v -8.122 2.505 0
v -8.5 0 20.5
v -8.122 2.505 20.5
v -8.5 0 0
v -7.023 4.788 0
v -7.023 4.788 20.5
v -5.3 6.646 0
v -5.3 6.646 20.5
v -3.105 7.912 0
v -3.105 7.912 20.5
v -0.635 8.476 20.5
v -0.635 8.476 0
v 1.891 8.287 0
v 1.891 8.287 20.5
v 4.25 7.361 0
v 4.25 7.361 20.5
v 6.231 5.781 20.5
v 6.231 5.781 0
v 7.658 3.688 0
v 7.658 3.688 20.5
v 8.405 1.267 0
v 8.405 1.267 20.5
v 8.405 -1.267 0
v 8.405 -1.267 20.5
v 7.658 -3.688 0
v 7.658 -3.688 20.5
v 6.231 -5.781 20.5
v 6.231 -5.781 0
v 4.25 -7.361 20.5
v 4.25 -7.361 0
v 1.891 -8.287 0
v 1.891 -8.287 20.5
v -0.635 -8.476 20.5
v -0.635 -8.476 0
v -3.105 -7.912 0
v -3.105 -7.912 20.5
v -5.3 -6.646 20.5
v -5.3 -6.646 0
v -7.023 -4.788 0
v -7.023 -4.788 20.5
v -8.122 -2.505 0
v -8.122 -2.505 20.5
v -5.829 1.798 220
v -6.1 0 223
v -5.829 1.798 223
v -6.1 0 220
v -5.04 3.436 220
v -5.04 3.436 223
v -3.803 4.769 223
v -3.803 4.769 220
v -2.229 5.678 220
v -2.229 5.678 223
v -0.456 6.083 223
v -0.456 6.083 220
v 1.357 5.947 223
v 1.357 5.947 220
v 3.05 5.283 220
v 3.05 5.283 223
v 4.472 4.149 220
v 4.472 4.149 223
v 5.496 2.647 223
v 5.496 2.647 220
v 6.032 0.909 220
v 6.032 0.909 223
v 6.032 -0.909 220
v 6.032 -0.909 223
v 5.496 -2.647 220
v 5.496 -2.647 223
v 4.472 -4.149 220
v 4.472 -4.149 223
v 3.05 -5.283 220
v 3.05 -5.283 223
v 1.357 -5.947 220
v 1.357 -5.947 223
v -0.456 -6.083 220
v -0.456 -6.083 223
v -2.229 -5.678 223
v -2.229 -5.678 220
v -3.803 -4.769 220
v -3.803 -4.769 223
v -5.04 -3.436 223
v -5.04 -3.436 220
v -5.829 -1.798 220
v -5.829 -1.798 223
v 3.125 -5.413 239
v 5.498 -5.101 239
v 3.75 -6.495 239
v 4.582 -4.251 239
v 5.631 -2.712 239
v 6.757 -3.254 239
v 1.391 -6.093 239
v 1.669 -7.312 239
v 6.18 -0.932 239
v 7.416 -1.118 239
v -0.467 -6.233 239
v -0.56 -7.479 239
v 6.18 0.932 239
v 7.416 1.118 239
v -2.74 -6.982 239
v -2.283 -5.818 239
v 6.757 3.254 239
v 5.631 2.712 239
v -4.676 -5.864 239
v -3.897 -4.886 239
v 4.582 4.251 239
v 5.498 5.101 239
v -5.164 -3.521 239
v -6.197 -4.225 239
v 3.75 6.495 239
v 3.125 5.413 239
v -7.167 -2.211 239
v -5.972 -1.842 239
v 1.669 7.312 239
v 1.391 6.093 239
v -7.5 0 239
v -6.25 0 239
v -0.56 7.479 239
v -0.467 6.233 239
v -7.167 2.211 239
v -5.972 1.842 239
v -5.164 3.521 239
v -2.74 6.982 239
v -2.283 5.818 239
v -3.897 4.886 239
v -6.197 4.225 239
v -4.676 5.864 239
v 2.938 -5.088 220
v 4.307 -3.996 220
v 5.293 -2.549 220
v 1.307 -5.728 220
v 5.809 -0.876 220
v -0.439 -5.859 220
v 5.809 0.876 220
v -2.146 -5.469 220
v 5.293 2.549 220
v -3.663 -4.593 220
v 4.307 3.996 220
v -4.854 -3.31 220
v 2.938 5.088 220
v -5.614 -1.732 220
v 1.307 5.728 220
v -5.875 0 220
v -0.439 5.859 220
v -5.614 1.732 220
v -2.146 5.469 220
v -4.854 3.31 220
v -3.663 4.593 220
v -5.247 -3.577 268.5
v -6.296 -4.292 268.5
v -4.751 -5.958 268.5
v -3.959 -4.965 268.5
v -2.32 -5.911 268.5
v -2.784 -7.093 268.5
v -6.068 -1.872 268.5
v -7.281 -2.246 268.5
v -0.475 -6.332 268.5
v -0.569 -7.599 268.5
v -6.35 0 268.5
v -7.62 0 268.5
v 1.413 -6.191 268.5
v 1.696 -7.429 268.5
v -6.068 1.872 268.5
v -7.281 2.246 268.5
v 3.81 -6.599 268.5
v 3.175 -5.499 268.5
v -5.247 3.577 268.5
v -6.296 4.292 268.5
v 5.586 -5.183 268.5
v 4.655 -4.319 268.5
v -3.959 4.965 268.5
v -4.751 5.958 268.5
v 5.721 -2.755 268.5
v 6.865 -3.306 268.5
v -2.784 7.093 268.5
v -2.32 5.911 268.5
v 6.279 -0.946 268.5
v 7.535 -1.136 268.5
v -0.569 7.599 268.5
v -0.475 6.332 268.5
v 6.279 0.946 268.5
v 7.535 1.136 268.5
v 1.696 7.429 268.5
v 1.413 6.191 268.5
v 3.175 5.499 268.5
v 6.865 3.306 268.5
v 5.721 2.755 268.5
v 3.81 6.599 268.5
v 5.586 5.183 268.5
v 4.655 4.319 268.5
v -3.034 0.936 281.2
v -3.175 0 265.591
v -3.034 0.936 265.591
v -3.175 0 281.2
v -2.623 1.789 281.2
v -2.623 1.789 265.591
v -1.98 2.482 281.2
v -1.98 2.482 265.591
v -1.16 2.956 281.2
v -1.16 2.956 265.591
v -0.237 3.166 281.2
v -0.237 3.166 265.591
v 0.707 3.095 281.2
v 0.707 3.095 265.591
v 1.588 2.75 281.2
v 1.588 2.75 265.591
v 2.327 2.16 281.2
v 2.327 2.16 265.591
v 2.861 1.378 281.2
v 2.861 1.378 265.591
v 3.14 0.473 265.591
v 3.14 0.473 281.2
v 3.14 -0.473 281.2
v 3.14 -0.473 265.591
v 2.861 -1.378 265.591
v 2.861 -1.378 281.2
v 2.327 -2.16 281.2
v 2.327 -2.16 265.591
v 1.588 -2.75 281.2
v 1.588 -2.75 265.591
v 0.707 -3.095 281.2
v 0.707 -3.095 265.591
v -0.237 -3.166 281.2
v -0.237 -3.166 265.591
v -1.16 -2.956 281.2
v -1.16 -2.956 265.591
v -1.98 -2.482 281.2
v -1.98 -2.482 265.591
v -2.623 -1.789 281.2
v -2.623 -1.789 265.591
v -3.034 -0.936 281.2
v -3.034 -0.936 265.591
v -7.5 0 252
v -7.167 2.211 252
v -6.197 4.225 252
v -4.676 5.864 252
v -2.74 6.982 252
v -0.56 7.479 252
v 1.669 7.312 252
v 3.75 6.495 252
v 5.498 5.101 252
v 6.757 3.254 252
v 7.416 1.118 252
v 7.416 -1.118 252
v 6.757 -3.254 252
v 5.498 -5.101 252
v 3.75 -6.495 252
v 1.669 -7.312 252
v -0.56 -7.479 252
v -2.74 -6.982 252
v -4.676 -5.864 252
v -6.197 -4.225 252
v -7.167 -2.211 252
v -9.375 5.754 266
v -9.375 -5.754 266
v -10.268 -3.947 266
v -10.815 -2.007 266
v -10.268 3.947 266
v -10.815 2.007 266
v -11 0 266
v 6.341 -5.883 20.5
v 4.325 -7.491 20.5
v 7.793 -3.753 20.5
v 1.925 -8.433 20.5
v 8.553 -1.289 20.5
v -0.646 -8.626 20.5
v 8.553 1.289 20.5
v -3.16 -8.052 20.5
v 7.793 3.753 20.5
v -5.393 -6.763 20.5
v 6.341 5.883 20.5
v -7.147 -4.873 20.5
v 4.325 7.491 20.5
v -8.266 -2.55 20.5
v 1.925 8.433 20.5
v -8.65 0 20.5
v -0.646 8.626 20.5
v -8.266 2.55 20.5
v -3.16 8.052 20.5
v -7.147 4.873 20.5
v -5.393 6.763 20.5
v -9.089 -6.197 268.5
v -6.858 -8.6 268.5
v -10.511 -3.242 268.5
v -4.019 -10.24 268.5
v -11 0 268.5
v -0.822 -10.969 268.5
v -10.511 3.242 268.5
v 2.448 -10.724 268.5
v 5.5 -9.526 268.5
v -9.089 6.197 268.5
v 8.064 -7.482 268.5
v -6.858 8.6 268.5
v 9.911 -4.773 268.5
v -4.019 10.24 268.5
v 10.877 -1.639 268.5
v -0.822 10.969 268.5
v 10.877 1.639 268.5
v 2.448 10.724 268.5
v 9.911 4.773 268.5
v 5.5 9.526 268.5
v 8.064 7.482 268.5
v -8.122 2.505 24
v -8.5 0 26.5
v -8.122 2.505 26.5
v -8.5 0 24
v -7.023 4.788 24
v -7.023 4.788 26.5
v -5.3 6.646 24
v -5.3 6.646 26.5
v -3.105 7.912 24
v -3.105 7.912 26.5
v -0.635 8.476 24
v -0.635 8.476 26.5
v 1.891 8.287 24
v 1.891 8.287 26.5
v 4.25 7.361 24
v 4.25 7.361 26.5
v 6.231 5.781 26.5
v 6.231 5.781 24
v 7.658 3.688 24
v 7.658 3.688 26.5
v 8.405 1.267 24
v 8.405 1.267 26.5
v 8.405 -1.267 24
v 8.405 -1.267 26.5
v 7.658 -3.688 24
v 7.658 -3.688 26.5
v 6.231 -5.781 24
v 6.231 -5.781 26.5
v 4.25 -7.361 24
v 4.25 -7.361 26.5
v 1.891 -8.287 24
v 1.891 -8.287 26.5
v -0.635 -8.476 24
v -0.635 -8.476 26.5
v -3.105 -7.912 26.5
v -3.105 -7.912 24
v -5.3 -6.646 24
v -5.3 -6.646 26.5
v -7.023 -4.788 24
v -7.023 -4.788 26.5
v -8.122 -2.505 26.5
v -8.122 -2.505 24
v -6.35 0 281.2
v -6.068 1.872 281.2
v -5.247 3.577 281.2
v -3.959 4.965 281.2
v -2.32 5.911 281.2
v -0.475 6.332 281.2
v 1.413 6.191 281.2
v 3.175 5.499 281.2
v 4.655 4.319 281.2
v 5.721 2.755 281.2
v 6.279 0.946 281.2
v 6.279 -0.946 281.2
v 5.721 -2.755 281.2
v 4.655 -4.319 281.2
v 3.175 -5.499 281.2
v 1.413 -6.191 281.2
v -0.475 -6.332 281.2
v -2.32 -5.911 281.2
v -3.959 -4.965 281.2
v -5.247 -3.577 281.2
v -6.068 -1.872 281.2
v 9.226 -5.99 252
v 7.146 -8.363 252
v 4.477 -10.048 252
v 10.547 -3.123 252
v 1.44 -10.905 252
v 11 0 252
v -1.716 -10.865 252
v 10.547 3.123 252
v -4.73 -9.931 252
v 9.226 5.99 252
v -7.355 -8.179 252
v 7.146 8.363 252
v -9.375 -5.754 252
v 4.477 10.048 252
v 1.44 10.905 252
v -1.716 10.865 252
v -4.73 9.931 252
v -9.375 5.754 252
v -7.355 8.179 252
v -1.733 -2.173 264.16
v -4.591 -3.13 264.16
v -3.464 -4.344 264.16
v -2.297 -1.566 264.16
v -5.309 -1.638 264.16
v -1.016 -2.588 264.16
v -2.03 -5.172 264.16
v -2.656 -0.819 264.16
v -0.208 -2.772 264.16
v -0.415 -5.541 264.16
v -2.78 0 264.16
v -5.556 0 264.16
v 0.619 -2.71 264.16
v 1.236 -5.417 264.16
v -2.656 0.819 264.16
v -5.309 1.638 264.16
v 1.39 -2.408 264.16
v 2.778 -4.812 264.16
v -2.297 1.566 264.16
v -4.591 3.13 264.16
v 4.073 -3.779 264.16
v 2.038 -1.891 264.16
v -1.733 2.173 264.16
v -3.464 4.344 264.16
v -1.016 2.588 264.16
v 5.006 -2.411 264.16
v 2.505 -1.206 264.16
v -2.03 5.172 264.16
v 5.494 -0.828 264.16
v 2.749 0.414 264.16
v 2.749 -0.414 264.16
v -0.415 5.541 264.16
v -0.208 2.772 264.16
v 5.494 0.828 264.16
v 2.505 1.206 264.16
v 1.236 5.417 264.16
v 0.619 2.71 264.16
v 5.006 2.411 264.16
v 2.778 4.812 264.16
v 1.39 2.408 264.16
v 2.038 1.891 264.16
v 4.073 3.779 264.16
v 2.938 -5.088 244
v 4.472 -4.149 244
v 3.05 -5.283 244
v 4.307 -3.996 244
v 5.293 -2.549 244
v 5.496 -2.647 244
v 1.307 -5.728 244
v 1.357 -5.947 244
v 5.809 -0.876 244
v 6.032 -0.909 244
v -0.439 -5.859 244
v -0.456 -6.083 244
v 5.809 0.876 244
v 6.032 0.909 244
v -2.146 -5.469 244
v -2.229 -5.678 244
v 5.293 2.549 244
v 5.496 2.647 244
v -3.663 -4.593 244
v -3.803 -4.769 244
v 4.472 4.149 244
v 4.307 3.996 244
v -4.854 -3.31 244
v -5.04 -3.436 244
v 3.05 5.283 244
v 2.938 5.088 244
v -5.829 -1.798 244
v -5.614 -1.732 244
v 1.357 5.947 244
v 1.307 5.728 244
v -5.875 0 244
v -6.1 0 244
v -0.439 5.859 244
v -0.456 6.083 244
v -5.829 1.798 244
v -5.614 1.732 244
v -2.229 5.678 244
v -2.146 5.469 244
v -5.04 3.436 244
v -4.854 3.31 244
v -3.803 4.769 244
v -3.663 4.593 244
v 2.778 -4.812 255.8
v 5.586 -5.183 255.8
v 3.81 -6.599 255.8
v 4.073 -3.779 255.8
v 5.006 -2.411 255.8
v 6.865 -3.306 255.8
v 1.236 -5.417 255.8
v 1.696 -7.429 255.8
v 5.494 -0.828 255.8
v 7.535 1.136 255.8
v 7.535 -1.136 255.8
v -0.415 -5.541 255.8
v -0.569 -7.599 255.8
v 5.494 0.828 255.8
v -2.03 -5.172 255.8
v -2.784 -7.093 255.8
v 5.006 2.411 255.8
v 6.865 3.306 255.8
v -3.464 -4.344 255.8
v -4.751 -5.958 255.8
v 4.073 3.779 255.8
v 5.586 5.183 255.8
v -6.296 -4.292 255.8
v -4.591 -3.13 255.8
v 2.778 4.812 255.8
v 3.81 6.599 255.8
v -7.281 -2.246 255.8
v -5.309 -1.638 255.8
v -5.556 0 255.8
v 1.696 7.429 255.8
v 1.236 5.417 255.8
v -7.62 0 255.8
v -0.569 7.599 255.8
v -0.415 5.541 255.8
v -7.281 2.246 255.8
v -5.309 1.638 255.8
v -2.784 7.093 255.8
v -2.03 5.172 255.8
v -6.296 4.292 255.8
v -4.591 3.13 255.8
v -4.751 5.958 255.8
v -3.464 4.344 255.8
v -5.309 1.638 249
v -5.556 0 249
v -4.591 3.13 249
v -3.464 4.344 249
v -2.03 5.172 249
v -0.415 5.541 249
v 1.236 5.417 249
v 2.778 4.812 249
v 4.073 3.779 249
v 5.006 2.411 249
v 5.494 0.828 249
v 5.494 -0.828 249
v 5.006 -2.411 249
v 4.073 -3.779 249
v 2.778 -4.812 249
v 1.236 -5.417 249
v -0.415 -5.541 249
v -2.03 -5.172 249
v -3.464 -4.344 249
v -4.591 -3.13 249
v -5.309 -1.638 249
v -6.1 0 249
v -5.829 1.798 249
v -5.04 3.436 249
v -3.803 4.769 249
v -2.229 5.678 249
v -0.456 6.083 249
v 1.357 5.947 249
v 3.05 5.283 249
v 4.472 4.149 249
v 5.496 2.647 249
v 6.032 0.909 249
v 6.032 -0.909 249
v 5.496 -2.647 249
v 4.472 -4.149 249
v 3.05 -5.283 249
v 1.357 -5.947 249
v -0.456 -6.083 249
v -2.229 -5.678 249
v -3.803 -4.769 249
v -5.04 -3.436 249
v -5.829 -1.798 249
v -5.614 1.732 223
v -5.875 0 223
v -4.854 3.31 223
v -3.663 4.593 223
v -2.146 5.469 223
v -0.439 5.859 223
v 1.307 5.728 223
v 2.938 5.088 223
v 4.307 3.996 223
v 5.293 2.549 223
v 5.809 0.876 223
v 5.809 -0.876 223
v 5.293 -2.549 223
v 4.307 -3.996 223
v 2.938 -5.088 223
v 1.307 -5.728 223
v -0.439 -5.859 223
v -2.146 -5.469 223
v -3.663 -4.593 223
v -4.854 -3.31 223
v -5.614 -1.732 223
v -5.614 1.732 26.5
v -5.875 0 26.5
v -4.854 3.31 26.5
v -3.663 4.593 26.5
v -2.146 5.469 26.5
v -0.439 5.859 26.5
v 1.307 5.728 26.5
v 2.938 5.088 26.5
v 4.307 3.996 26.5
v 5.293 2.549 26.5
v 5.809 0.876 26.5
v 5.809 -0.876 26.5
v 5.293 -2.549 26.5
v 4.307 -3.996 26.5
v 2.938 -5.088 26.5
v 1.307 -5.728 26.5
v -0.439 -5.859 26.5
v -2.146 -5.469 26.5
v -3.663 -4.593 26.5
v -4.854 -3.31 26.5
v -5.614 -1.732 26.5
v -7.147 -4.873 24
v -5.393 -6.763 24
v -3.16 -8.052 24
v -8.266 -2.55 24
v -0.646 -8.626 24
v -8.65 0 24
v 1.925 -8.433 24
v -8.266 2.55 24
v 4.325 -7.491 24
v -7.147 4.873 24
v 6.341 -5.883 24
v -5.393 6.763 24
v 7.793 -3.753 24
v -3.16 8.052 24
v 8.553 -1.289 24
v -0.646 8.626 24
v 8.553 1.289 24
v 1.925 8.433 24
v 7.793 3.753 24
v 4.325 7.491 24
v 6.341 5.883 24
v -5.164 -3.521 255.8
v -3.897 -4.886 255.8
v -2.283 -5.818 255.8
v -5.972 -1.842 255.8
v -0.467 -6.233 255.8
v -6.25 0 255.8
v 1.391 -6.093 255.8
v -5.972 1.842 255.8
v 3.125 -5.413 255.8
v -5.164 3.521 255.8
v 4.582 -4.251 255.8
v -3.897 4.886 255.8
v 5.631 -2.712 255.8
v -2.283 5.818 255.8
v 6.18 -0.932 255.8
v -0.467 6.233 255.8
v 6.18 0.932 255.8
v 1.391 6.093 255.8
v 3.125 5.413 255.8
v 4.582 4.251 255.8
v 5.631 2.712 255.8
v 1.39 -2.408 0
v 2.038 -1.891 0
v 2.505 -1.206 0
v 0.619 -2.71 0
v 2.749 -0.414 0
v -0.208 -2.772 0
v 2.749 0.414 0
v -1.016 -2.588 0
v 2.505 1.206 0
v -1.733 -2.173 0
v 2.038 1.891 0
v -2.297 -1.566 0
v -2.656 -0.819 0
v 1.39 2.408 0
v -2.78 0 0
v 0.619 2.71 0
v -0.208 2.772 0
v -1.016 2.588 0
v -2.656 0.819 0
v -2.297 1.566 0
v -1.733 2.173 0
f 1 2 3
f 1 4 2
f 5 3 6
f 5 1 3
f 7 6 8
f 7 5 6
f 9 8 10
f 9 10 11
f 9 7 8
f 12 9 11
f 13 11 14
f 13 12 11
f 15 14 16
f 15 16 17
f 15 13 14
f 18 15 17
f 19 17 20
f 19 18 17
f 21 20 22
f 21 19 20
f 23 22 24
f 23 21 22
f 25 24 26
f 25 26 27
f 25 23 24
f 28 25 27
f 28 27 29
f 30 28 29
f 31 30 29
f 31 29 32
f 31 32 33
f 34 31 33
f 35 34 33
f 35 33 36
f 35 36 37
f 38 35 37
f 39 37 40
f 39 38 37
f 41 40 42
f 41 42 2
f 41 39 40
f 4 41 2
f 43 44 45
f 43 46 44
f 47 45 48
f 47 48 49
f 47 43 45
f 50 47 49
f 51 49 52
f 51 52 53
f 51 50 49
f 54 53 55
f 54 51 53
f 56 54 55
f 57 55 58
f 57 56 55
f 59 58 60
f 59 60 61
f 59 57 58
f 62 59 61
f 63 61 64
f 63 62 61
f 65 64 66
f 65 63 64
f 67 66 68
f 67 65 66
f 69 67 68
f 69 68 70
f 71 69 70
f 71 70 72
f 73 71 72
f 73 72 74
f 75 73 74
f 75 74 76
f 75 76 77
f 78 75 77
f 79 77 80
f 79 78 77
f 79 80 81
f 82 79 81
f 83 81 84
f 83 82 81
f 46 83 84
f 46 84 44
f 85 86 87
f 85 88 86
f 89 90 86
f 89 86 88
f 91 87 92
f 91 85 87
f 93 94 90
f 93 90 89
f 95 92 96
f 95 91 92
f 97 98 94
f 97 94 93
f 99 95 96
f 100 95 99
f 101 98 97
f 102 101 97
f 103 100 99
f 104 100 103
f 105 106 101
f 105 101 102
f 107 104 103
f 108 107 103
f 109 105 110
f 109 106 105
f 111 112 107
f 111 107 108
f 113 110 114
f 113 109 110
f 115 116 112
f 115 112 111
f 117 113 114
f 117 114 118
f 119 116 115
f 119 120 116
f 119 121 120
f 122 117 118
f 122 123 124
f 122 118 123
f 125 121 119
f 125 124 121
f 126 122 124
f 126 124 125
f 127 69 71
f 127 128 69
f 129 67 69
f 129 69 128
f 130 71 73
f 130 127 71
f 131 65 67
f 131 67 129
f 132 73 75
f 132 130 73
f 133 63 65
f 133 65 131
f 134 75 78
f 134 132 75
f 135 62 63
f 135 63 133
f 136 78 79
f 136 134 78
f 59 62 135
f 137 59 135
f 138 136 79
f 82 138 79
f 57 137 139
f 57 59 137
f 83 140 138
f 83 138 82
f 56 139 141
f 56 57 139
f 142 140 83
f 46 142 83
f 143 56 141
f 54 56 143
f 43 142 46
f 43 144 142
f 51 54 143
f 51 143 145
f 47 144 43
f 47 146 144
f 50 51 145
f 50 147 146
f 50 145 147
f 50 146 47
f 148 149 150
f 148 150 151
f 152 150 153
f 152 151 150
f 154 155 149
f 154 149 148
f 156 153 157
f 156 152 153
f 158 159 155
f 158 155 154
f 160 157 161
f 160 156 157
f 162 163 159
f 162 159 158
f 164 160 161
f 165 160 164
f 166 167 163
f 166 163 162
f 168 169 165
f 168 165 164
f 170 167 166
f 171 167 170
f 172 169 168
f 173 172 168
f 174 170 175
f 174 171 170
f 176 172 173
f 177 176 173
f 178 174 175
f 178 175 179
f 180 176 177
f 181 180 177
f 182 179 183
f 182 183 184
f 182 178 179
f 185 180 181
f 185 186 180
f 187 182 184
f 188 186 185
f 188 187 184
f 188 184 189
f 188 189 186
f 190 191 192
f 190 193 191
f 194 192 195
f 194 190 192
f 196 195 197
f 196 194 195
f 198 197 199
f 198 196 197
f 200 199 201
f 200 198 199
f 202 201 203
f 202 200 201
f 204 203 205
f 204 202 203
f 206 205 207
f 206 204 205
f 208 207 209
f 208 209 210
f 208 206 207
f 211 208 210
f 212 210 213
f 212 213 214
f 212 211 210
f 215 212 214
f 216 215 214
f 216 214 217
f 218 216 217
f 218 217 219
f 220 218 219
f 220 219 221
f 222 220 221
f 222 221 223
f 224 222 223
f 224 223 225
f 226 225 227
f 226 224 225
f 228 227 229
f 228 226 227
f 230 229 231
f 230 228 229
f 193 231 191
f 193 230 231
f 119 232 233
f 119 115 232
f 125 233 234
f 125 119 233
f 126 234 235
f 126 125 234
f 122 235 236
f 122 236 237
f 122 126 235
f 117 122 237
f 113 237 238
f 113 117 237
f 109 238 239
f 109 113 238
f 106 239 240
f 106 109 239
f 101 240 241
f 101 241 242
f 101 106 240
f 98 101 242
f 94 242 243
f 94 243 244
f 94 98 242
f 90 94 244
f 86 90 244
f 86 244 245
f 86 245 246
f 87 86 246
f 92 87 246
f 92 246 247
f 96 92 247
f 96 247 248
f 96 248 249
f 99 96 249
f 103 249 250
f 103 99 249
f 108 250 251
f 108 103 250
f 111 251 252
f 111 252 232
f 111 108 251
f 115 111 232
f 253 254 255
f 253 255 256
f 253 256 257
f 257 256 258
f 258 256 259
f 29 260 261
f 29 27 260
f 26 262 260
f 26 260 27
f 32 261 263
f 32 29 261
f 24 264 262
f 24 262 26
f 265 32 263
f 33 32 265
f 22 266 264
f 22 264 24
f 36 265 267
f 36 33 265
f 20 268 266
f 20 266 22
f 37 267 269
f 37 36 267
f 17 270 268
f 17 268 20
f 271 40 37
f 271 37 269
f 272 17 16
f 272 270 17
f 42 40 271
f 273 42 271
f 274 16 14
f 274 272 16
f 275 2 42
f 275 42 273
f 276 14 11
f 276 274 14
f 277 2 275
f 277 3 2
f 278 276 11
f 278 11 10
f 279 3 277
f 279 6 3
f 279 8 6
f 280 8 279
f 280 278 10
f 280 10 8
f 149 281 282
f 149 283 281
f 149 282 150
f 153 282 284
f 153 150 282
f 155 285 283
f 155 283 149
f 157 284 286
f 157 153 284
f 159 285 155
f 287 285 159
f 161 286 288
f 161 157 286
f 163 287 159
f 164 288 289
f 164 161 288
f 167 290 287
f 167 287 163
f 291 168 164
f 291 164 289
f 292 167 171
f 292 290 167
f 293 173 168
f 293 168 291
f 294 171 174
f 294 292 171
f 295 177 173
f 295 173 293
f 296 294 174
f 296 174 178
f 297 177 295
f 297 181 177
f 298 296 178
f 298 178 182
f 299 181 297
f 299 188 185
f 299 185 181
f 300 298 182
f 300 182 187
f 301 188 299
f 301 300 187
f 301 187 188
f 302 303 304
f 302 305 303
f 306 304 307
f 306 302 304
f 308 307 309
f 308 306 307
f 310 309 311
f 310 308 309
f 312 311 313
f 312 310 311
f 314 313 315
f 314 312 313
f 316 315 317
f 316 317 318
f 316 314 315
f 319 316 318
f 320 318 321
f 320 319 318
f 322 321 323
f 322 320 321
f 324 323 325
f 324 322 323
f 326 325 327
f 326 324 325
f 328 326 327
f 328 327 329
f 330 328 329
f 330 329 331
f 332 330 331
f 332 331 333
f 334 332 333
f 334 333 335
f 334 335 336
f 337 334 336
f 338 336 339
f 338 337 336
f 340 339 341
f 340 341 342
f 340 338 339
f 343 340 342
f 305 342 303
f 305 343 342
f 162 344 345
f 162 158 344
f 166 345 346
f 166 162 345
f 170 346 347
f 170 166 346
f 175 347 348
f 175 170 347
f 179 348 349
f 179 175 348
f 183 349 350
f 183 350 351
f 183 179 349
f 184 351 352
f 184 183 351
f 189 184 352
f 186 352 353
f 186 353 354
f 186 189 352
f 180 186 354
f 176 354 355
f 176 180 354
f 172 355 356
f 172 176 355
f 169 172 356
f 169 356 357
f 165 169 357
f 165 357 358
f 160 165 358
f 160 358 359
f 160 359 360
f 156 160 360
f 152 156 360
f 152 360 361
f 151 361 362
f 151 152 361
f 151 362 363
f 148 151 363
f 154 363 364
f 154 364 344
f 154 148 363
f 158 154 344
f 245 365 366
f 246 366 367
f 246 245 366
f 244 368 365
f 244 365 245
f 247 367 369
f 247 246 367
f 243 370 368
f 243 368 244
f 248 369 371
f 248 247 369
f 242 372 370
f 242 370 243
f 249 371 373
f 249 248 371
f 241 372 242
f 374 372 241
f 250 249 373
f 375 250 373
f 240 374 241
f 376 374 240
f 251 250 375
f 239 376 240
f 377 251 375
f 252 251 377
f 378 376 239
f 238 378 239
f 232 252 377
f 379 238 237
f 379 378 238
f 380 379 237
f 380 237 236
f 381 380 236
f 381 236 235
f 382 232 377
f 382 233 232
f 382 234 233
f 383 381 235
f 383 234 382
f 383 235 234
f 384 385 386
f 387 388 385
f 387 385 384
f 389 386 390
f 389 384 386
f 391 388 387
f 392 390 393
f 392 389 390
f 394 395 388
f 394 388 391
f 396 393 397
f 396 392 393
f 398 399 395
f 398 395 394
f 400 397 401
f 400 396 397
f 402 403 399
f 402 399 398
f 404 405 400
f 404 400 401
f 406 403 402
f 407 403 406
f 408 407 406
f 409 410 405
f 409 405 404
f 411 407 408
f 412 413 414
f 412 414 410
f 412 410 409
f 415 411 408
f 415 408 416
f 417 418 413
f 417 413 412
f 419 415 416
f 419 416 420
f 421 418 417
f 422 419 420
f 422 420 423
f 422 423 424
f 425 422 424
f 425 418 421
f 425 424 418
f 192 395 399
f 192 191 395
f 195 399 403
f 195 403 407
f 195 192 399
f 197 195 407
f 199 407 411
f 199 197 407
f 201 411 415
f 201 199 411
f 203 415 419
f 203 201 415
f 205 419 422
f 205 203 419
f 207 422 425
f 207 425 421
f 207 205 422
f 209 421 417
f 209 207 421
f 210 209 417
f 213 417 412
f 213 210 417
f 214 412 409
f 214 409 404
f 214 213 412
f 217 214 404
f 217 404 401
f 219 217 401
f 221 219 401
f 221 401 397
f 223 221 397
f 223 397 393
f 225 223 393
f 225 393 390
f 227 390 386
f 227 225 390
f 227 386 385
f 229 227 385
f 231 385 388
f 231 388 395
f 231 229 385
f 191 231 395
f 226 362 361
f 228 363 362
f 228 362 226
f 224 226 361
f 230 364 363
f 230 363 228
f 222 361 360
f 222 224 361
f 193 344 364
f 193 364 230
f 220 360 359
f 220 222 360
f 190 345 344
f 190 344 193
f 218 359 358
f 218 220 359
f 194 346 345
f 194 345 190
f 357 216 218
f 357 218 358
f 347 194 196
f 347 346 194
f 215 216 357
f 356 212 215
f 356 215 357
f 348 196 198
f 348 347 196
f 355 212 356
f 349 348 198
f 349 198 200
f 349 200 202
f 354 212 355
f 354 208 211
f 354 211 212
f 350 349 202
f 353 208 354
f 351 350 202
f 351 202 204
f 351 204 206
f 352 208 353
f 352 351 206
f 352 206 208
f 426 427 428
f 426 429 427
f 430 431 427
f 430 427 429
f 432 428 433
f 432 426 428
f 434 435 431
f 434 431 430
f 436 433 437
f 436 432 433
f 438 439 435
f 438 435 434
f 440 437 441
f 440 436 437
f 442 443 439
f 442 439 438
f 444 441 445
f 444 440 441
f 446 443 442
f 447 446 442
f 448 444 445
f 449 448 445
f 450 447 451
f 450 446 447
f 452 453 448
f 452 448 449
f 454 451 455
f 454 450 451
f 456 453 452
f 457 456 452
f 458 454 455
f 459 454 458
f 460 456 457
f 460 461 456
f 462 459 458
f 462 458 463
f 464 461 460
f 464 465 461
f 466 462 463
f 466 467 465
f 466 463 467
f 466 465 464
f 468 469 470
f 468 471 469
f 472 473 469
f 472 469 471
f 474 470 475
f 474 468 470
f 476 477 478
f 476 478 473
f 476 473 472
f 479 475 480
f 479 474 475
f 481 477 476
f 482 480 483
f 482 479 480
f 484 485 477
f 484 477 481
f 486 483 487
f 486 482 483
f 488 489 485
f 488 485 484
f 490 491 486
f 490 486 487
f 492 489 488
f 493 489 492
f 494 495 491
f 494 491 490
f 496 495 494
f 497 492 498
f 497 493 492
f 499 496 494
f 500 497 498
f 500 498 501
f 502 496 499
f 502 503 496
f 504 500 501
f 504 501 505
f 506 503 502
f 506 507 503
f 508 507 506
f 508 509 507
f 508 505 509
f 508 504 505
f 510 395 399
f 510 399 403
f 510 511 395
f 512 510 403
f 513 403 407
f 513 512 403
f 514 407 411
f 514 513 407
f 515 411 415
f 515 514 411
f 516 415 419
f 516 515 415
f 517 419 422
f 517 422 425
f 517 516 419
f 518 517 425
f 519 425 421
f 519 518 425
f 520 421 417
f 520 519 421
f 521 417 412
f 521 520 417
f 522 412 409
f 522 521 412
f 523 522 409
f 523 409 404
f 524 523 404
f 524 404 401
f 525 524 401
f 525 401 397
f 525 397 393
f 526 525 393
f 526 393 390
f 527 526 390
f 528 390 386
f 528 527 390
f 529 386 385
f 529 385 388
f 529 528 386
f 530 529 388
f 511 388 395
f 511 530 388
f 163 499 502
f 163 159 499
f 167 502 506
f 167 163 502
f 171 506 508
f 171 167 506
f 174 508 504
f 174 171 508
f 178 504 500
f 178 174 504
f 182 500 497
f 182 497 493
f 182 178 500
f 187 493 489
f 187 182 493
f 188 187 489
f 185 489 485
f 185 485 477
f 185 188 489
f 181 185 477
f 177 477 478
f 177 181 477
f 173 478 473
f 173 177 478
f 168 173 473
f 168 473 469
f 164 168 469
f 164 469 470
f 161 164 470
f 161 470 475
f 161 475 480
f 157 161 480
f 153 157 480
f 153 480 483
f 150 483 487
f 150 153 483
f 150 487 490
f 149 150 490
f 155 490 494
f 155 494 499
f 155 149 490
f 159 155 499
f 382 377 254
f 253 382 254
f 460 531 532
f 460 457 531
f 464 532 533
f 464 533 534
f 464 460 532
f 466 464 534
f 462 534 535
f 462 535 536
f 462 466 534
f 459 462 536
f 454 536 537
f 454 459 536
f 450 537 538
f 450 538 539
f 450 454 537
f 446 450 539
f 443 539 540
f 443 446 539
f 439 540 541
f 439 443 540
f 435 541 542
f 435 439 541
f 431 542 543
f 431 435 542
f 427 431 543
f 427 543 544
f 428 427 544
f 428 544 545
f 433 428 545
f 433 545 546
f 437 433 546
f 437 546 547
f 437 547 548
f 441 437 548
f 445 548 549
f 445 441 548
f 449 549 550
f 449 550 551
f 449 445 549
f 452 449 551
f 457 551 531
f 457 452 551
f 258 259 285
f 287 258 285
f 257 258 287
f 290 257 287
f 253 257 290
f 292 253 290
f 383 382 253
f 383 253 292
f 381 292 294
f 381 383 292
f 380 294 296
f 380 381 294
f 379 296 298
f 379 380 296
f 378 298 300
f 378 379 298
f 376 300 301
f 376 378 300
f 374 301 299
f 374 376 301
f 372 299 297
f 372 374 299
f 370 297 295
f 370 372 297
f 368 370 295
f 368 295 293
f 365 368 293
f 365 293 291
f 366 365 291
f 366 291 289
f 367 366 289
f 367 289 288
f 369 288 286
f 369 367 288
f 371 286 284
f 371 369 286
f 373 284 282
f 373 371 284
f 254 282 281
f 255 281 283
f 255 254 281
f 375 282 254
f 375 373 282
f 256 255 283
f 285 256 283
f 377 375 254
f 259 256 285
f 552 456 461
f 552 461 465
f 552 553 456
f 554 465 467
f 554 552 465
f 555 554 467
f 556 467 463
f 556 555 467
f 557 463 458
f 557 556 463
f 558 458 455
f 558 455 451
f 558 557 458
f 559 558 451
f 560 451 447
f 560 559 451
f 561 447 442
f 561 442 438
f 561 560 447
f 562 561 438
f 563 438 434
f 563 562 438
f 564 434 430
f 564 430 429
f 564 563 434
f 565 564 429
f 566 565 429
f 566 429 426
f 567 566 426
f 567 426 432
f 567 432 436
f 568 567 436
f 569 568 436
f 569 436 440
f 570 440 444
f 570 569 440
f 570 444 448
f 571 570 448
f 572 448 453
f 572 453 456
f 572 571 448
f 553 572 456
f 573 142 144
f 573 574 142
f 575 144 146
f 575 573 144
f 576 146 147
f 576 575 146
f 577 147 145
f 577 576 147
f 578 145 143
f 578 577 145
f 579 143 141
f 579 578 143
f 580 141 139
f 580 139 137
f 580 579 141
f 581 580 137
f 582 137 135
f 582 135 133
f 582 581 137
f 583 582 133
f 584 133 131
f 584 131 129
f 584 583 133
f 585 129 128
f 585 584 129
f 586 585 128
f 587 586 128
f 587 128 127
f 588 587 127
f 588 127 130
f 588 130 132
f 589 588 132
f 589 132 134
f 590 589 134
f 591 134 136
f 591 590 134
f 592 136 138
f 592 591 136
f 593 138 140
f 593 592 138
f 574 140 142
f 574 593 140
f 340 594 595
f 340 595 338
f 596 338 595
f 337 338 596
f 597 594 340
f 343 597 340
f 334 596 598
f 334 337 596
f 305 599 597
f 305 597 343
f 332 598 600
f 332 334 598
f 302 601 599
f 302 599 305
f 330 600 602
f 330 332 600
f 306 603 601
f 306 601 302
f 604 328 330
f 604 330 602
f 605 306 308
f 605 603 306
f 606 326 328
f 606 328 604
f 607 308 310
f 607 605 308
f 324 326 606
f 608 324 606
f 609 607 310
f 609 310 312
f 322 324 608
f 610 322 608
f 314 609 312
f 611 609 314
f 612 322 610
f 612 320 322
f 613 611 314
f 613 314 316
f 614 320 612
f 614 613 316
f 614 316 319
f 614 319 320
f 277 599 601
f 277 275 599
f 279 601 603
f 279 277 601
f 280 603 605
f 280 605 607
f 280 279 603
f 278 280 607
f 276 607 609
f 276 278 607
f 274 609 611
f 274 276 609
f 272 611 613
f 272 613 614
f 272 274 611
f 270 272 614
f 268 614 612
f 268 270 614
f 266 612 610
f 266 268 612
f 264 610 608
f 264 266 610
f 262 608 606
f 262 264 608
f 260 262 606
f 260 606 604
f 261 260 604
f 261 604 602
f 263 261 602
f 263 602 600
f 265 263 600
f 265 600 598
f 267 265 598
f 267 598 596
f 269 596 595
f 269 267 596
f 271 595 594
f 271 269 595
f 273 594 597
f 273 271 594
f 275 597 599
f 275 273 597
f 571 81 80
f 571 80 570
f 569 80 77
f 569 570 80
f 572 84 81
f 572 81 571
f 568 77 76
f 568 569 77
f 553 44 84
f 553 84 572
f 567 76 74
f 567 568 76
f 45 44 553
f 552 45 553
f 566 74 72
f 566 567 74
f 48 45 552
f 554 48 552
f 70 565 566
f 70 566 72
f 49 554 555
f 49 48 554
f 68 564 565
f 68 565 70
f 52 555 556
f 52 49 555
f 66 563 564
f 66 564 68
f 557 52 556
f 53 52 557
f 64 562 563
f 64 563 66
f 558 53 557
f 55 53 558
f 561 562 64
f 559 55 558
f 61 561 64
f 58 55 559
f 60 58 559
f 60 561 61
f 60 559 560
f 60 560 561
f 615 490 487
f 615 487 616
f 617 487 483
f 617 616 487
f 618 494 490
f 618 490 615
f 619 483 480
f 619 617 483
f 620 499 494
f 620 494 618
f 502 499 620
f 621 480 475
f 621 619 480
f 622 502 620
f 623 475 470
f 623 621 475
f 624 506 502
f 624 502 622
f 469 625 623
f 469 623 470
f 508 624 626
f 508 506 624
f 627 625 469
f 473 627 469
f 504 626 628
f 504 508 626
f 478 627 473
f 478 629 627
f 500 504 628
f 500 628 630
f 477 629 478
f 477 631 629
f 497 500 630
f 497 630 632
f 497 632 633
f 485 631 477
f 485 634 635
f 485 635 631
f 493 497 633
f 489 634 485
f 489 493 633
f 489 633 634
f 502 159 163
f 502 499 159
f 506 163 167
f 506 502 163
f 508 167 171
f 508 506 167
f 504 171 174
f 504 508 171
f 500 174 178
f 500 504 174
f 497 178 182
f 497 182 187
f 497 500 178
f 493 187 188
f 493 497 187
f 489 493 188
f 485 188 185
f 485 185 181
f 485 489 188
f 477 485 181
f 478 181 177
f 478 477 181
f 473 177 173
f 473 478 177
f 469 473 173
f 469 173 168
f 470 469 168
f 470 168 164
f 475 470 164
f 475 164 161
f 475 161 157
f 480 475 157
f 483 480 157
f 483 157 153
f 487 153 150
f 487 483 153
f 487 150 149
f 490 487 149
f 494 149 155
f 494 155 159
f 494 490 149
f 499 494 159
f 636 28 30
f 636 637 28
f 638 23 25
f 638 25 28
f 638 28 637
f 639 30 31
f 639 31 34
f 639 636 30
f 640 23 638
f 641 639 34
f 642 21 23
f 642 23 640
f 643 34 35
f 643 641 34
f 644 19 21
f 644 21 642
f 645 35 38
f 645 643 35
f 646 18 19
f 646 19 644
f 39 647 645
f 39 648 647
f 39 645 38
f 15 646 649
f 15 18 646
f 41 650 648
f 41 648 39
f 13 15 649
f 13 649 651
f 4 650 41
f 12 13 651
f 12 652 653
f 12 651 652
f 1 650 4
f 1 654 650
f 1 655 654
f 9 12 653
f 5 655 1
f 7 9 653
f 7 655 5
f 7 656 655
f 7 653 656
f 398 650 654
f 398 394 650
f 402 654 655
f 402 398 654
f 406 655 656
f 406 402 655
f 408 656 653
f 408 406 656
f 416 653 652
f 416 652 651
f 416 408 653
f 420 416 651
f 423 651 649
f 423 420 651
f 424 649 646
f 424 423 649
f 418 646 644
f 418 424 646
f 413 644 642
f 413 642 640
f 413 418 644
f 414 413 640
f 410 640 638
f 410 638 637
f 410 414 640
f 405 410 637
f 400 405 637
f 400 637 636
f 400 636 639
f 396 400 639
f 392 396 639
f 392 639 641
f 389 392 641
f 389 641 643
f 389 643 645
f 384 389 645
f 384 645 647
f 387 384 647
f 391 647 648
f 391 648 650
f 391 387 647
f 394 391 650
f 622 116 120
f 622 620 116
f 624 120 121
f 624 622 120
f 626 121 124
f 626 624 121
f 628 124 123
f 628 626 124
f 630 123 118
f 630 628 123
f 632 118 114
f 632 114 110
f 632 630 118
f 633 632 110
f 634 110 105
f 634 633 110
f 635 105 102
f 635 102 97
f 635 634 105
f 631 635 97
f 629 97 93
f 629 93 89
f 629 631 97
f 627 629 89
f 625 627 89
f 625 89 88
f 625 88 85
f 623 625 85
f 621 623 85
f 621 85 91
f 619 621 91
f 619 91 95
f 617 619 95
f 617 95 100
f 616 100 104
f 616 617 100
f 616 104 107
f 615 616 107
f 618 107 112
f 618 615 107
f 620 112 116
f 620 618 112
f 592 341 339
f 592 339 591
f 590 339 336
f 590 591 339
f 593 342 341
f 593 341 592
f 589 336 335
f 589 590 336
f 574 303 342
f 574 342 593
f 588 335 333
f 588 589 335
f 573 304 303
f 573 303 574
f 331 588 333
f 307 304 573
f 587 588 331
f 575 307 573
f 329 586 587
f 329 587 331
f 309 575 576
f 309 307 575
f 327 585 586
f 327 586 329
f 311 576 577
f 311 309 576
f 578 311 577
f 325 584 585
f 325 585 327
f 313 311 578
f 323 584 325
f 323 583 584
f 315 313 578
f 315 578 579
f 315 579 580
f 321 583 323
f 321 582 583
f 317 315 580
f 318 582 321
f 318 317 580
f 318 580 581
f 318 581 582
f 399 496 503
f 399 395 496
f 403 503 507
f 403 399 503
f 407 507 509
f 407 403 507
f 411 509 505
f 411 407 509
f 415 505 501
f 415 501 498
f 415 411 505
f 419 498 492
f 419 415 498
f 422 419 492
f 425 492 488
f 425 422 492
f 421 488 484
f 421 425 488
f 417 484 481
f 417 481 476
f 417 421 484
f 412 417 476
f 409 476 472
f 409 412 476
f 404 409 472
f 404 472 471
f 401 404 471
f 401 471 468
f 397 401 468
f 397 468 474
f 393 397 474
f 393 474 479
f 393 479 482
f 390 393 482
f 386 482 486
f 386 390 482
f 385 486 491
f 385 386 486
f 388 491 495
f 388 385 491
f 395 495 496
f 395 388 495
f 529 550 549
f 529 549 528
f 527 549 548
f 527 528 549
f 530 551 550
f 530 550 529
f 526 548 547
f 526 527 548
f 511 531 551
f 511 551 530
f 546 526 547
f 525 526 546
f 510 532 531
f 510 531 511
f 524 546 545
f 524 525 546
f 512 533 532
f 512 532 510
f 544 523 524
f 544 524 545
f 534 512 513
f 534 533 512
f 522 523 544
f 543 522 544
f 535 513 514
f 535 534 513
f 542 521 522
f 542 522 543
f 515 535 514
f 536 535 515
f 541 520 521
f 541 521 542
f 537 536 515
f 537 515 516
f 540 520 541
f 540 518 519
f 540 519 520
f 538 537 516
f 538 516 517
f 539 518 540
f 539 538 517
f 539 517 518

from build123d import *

# Parameters (mm, degrees)
F2_W     = 1.625
F2_H     = 14
F4_DEPTH = 12.7


with BuildPart() as f1:
    # F0 (on Front) → F1 (revolve)
    with BuildSketch(Plane.XZ):
        Polygon((-8.5, 0), (-2.78, 0), (-2.78, 264.16), (-5.55625, 264.16), (-5.55625, 249), (-6.1, 249), (-6.1, 244), (-5.875, 244), (-5.875, 223), (-6.1, 223), (-6.1, 220), (-5.875, 220), (-5.875, 26.5), (-8.5, 26.5), (-8.5, 24), (-8.65, 24), (-8.65, 20.5), (-8.5, 20.5), align=None)
    revolve(axis=Axis((0, 0, 132.08), (0, 0, -1)))


with BuildPart() as f3:
    # F2 (on Front) → F3 (revolve)
    with BuildSketch(Plane.XZ):
        with Locations((-10.1875, 259)):
            Rectangle(F2_W, F2_H)
        Polygon((-7.5, 239), (-6.25, 239), (-6.25, 255.8), (-7.62, 255.8), (-7.62, 268.5), (-11, 268.5), (-11, 266), (-9.375, 266), (-9.375, 252), (-7.5, 252), align=None)
    revolve(axis=Axis((0, 0, 253.75), (0, 0, -1)))

    # F2 (on Front) → F4 (cut, symmetric)
    with BuildSketch(Plane.XZ):
        with Locations((-10.1875, 259)):
            Rectangle(F2_W, F2_H)
    extrude(amount=F4_DEPTH, both=True, mode=Mode.SUBTRACT)


with BuildPart() as f6:
    # F5 (on Front) → F6 (revolve)
    with BuildSketch(Plane.XZ):
        Polygon((-7.62, 255.8), (-5.55625, 255.8), (-5.55625, 264.16), (-3.175, 265.5907993491), (-3.175, 281.2), (-6.35, 281.2), (-6.35, 268.5), (-7.62, 268.5), align=None)
    revolve(axis=Axis((0, 0, 268.5), (0, 0, -1)))


solid = Compound([f1.part, f3.part, f6.part])
